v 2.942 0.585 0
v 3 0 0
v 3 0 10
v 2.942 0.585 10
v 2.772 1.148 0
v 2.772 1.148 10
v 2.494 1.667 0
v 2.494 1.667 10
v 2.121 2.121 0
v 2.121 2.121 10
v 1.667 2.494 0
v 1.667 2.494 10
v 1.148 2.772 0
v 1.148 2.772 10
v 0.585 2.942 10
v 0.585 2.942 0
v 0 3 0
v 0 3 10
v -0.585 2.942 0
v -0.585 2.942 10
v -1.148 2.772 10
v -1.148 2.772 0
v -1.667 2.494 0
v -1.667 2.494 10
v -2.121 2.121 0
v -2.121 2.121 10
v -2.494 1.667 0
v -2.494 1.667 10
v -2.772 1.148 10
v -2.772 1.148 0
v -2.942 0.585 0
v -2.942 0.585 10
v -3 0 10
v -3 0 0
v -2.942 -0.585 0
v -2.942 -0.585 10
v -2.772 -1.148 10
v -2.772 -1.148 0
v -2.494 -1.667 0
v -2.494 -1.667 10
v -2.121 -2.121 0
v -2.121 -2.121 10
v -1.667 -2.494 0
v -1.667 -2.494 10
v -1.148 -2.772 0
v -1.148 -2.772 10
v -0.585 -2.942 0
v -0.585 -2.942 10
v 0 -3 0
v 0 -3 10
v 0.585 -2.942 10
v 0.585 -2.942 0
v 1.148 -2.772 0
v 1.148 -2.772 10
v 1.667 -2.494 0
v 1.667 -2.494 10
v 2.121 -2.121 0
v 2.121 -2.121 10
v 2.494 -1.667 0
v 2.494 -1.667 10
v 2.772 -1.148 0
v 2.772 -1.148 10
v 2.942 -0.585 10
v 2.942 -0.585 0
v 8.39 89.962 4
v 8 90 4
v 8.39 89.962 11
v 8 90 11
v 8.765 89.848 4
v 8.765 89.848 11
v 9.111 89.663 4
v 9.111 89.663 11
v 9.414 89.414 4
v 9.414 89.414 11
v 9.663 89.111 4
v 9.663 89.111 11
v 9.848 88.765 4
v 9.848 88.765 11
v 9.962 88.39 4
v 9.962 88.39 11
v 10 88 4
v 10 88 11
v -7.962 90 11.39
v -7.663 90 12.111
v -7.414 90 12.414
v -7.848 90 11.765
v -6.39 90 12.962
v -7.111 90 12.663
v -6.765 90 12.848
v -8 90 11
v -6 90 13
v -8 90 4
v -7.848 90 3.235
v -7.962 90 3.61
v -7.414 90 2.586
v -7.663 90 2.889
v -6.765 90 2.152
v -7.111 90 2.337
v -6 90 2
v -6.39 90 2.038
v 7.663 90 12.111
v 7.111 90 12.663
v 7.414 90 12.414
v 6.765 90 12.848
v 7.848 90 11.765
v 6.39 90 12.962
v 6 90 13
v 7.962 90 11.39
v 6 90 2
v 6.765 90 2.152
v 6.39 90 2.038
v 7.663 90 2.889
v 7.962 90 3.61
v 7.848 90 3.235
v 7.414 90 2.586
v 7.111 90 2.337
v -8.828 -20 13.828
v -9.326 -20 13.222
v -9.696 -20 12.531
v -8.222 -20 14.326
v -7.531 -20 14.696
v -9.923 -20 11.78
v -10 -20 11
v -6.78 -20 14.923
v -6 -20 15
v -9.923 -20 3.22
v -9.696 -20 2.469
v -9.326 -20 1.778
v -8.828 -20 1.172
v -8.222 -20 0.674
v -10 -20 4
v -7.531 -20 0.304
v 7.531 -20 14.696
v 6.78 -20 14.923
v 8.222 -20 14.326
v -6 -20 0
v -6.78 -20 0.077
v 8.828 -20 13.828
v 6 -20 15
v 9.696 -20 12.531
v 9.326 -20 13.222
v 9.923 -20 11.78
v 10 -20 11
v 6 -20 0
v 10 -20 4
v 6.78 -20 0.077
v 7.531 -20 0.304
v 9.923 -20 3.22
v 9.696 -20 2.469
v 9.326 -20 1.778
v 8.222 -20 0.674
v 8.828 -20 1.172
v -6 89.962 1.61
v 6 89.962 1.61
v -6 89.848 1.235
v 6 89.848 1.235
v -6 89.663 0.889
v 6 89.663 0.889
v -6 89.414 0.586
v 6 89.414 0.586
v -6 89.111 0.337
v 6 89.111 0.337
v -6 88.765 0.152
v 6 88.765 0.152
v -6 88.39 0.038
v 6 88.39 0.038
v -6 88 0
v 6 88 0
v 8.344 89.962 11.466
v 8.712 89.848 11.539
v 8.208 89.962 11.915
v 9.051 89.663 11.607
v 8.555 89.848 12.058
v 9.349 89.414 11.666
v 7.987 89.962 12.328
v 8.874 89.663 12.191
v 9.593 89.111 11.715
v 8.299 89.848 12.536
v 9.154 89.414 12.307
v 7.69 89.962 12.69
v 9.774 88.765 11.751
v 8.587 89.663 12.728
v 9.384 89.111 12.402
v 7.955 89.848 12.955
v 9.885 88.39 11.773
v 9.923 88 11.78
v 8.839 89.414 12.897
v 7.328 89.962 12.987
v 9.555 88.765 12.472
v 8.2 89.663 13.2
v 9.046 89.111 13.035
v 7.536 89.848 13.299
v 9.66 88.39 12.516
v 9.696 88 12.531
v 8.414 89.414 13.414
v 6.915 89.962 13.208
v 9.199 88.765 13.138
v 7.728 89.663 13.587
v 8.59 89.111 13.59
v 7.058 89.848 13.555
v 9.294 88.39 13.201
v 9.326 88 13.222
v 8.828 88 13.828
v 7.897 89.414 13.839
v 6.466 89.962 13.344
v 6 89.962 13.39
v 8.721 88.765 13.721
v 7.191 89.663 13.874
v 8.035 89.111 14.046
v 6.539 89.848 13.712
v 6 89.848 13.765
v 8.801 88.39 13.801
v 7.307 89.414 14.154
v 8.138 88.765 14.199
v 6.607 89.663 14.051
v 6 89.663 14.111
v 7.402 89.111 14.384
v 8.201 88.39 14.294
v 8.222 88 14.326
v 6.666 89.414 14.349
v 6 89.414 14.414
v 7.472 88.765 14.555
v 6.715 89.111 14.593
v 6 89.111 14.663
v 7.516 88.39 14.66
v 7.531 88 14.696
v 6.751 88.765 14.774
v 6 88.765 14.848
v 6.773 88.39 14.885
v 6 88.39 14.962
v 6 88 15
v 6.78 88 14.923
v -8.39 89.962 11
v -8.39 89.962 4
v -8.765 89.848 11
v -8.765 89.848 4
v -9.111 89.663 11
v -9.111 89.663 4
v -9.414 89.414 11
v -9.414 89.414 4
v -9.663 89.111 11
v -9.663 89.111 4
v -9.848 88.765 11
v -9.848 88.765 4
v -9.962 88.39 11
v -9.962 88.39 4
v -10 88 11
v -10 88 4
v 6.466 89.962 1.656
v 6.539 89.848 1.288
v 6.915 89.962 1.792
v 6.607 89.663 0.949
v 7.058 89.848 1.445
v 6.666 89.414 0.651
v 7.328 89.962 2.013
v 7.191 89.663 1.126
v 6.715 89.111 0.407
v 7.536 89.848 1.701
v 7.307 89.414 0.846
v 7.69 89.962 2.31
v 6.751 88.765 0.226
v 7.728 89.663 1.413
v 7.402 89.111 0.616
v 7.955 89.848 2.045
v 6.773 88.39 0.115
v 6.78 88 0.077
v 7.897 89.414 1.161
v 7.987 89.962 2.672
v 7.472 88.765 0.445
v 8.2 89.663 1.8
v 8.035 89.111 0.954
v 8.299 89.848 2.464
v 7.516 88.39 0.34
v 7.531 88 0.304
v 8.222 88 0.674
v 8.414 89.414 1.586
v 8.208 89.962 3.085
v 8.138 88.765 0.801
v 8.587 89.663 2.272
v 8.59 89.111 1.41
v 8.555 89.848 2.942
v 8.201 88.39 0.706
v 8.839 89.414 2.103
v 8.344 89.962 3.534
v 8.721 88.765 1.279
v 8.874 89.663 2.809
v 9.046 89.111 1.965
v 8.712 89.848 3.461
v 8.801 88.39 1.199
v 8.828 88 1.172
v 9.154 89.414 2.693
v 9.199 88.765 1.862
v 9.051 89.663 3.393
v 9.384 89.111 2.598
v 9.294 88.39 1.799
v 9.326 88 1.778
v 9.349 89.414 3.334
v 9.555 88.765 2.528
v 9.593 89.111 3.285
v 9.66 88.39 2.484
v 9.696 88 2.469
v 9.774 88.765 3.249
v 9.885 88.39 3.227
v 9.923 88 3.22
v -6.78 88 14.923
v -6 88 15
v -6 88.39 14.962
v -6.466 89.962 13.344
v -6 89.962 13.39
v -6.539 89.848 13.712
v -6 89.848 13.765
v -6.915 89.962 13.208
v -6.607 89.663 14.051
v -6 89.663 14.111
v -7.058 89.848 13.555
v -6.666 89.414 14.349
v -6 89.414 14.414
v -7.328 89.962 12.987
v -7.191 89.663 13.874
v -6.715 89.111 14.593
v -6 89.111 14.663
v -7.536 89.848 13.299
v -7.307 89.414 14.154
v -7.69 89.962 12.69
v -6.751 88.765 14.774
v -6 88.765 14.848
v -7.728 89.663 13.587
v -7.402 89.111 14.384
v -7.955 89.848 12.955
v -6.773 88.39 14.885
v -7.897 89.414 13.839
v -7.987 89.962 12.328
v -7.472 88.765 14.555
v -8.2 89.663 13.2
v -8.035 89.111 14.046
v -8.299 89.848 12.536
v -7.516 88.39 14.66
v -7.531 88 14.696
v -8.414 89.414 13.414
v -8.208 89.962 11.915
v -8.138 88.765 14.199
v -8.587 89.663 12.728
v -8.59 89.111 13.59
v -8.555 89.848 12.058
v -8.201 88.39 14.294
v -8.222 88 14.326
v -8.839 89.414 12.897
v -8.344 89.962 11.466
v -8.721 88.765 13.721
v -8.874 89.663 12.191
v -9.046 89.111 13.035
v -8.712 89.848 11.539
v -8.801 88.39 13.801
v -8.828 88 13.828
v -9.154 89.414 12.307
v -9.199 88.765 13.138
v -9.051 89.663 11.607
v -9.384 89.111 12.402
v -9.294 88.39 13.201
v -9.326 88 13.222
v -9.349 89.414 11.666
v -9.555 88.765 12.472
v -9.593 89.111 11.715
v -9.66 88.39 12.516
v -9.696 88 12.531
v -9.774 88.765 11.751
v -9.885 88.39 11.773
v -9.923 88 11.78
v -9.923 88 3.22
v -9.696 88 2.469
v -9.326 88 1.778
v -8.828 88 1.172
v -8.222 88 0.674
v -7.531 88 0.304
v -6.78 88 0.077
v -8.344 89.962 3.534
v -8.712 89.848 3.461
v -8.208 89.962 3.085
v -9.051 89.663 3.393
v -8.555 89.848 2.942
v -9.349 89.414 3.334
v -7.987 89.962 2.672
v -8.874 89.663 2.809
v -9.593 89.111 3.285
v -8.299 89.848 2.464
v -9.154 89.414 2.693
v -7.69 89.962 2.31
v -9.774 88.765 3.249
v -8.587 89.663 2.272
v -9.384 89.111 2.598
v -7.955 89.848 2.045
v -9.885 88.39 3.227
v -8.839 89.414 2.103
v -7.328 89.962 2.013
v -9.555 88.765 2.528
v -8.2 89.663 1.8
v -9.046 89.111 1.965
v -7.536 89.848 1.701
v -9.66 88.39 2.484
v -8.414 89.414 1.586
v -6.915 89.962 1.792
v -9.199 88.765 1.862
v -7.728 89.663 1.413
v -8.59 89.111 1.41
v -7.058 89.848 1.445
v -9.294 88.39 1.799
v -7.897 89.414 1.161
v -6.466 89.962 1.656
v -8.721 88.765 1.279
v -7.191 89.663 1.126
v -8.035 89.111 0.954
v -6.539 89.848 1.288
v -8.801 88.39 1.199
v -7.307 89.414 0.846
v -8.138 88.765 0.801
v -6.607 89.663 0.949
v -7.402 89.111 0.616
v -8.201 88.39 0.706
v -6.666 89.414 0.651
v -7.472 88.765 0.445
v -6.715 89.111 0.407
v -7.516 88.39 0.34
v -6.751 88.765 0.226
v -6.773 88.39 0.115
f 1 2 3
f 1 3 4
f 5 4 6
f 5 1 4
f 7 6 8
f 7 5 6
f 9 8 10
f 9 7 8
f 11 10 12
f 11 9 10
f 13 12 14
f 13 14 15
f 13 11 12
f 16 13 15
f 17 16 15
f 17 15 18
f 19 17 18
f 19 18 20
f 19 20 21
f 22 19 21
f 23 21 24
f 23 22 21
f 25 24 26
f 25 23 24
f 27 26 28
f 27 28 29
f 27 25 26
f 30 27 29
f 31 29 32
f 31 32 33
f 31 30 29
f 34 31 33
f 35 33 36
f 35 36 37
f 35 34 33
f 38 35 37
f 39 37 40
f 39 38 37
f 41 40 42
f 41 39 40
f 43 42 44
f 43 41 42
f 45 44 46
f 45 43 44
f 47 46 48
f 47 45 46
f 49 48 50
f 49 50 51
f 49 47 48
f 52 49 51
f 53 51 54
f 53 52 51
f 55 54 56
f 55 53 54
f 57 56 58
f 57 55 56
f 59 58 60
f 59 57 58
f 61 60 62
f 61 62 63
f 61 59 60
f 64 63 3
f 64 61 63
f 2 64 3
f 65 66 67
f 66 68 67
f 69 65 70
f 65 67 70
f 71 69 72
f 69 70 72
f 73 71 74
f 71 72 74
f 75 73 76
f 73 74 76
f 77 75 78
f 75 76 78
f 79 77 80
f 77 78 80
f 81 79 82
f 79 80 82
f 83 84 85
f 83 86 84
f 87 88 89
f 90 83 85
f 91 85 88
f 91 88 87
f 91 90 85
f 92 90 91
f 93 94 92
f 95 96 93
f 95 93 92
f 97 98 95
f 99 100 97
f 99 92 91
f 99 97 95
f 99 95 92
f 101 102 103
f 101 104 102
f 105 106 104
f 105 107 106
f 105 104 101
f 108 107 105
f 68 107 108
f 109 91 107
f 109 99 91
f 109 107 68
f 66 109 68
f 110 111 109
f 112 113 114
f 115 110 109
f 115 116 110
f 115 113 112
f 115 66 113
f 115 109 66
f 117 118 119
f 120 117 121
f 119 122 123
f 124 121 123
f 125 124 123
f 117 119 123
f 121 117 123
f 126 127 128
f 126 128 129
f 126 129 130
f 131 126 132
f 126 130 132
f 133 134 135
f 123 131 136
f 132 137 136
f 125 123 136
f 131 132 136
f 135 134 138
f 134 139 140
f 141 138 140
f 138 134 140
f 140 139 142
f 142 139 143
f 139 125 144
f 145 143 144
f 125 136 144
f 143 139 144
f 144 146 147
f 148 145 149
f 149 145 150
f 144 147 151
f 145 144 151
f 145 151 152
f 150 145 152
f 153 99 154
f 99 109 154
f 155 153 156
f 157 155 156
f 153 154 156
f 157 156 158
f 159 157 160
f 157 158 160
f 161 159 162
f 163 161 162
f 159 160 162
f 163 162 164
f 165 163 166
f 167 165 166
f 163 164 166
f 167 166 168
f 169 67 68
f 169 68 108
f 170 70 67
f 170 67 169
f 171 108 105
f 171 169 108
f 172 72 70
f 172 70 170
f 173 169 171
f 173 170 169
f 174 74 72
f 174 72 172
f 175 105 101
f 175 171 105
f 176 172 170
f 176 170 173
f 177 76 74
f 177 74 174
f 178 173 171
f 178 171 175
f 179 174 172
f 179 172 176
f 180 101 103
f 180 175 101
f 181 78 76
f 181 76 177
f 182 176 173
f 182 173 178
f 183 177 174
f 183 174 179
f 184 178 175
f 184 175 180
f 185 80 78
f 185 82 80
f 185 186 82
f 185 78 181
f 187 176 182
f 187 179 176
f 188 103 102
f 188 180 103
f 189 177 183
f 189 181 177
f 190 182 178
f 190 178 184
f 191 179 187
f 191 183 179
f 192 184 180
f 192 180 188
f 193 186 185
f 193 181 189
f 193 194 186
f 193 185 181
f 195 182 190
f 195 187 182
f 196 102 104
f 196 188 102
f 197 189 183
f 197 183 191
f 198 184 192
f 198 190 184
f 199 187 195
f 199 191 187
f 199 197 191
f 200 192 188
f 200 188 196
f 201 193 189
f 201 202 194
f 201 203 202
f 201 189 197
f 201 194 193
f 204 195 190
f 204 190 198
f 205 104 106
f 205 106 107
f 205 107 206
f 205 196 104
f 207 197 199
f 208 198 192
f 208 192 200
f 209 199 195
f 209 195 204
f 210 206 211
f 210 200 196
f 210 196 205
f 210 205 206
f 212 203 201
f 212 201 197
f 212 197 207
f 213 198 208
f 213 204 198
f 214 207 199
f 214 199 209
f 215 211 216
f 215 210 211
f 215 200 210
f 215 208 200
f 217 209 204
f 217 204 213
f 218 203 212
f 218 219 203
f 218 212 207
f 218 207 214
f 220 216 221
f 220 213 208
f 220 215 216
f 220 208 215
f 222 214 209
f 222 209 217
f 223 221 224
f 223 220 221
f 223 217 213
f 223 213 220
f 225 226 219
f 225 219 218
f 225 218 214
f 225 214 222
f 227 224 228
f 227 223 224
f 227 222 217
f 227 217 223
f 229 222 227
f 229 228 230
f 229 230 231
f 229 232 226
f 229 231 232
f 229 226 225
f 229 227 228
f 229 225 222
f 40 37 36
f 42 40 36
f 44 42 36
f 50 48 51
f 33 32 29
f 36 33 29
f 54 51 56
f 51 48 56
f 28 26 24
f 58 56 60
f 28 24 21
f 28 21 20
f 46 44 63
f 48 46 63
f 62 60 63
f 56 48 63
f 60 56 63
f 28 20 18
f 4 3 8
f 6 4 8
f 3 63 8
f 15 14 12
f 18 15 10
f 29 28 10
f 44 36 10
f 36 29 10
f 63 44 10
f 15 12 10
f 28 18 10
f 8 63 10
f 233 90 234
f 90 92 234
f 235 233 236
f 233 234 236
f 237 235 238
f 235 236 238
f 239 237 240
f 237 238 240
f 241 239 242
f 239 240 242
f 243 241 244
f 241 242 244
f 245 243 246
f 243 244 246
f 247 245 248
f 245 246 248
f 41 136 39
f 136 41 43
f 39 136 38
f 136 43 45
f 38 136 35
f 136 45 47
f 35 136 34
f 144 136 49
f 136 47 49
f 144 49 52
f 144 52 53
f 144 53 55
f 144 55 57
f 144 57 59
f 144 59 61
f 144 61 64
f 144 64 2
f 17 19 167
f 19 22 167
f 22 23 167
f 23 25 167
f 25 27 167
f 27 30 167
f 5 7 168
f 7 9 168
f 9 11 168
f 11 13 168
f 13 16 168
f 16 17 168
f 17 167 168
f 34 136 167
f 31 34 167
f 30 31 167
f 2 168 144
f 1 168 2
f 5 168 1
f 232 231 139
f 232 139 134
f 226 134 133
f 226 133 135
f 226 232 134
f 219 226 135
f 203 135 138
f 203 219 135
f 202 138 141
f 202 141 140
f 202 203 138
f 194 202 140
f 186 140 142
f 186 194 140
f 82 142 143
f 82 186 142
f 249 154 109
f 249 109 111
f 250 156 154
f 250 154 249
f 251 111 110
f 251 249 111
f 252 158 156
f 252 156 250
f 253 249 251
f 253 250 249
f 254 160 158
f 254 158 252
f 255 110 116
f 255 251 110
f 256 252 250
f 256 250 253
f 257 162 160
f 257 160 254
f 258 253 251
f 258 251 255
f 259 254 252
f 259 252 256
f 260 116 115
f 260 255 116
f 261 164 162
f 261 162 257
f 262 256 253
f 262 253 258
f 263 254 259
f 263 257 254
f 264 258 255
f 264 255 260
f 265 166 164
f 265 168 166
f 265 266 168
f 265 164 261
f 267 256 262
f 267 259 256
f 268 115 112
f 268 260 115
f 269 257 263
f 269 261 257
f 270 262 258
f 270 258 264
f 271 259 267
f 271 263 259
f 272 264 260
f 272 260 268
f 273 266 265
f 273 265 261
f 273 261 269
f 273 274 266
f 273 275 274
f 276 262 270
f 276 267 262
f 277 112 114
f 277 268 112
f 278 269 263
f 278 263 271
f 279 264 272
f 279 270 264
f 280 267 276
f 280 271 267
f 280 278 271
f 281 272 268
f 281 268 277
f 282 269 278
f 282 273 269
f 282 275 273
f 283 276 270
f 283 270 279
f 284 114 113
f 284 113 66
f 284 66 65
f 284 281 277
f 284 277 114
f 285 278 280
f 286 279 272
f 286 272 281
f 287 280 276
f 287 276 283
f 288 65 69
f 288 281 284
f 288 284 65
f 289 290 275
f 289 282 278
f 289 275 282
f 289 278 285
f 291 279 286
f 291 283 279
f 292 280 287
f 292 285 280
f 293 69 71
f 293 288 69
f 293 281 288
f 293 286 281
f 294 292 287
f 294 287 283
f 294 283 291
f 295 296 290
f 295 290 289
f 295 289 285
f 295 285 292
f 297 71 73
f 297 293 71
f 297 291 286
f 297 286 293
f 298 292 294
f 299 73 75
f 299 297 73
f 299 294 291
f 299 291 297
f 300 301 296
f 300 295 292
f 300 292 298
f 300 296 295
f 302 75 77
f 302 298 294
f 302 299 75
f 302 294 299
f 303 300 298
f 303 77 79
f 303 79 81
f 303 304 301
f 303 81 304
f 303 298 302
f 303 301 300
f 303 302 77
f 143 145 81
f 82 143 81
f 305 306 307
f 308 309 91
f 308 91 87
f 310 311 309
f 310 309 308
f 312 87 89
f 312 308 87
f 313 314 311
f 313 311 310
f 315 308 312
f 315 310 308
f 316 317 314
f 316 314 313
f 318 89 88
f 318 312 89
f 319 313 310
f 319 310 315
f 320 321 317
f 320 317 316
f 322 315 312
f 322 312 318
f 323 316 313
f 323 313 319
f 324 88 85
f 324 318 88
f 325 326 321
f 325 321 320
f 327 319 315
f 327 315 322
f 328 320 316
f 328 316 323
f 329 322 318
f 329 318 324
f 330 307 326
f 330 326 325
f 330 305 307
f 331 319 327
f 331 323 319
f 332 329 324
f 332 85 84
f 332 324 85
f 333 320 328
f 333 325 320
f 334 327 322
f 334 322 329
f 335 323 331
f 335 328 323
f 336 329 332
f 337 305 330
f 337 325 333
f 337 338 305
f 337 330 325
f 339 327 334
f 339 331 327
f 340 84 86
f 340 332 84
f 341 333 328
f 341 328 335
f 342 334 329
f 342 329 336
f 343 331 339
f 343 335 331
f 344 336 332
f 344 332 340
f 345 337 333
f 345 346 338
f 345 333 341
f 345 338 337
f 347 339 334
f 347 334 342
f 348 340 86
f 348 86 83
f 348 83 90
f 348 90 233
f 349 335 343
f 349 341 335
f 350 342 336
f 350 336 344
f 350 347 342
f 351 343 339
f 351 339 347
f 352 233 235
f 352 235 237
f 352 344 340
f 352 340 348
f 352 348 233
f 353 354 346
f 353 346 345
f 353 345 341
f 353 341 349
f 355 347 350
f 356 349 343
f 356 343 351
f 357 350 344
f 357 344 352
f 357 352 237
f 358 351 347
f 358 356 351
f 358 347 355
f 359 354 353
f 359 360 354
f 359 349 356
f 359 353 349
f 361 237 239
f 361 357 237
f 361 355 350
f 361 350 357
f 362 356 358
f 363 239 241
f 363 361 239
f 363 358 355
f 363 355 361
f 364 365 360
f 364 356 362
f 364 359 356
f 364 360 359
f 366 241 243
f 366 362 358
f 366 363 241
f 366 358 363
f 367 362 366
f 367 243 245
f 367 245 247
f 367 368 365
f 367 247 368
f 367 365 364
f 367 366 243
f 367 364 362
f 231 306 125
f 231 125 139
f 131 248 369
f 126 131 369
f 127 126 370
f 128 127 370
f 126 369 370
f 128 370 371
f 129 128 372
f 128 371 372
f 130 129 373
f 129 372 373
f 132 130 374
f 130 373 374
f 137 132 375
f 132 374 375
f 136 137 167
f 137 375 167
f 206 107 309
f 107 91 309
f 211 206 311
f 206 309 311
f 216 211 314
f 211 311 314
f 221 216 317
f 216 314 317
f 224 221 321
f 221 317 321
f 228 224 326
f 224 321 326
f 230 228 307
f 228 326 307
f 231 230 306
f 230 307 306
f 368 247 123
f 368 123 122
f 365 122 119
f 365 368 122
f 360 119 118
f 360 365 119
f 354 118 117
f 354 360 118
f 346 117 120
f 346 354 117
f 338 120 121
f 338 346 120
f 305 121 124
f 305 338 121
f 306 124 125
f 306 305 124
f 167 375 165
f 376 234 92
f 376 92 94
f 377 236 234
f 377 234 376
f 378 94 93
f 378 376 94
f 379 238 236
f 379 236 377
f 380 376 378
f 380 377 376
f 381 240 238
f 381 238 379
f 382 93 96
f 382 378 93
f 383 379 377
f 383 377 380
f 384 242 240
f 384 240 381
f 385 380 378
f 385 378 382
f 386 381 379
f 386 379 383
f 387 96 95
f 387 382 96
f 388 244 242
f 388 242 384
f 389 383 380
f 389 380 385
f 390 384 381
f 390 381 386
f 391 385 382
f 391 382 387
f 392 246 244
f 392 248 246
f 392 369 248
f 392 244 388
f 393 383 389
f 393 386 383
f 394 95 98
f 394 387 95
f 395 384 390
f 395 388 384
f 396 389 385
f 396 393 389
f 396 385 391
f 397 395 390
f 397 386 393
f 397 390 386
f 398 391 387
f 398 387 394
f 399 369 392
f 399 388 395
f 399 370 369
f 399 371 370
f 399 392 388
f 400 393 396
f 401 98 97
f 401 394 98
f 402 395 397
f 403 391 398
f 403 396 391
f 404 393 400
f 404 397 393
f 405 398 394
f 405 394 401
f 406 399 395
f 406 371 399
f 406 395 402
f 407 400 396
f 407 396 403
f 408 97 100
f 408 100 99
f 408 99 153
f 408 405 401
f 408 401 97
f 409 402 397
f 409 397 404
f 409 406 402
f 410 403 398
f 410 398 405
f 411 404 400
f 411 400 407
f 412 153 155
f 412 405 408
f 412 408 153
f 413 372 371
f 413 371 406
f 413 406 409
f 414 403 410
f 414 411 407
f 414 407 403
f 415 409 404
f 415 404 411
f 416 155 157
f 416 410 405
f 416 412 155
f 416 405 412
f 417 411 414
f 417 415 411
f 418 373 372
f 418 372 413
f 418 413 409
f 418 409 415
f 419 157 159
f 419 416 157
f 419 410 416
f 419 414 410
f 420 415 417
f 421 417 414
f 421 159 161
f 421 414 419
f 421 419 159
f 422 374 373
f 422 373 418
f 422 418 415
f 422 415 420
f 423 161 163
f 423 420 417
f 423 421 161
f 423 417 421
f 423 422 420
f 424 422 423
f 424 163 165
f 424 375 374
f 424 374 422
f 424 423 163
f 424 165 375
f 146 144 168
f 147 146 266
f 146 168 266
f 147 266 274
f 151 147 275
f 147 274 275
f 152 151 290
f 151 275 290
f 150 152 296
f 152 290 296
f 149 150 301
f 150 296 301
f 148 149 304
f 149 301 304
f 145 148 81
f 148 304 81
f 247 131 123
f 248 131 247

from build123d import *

# Parameters (mm, degrees)
F0_W     = 20
F0_H     = 110
F1_DEPTH = 15
F2_R     = 3
F3_DEPTH = 10
F4_R     = 4
F5_R     = 2


with BuildPart() as f1:
    # F0 (on Top) → F1 (new body)
    with BuildSketch(Plane.XY):
        with Locations((0, 35)):
            Rectangle(F0_W, F0_H)
    extrude(amount=F1_DEPTH)

    # F2 (on Top) → F3 (cut)
    with BuildSketch(Plane.XY):
        Circle(F2_R)
    extrude(amount=F3_DEPTH, mode=Mode.SUBTRACT)

    # F4
    f4_edges = [f1.edges().sort_by_distance(p)[0] for p in [
        (10, 35, 15),
        (-10, 35, 15),
        (10, 35, 0),
        (-10, 35, 0),
    ]]
    fillet(f4_edges, radius=F4_R)

    # F5
    f5_edges = [f1.edges().sort_by_distance(p)[0] for p in [
        (8.828427, 90, 1.171573),
    ]]
    fillet(f5_edges, radius=F5_R)


solid = f1.part
